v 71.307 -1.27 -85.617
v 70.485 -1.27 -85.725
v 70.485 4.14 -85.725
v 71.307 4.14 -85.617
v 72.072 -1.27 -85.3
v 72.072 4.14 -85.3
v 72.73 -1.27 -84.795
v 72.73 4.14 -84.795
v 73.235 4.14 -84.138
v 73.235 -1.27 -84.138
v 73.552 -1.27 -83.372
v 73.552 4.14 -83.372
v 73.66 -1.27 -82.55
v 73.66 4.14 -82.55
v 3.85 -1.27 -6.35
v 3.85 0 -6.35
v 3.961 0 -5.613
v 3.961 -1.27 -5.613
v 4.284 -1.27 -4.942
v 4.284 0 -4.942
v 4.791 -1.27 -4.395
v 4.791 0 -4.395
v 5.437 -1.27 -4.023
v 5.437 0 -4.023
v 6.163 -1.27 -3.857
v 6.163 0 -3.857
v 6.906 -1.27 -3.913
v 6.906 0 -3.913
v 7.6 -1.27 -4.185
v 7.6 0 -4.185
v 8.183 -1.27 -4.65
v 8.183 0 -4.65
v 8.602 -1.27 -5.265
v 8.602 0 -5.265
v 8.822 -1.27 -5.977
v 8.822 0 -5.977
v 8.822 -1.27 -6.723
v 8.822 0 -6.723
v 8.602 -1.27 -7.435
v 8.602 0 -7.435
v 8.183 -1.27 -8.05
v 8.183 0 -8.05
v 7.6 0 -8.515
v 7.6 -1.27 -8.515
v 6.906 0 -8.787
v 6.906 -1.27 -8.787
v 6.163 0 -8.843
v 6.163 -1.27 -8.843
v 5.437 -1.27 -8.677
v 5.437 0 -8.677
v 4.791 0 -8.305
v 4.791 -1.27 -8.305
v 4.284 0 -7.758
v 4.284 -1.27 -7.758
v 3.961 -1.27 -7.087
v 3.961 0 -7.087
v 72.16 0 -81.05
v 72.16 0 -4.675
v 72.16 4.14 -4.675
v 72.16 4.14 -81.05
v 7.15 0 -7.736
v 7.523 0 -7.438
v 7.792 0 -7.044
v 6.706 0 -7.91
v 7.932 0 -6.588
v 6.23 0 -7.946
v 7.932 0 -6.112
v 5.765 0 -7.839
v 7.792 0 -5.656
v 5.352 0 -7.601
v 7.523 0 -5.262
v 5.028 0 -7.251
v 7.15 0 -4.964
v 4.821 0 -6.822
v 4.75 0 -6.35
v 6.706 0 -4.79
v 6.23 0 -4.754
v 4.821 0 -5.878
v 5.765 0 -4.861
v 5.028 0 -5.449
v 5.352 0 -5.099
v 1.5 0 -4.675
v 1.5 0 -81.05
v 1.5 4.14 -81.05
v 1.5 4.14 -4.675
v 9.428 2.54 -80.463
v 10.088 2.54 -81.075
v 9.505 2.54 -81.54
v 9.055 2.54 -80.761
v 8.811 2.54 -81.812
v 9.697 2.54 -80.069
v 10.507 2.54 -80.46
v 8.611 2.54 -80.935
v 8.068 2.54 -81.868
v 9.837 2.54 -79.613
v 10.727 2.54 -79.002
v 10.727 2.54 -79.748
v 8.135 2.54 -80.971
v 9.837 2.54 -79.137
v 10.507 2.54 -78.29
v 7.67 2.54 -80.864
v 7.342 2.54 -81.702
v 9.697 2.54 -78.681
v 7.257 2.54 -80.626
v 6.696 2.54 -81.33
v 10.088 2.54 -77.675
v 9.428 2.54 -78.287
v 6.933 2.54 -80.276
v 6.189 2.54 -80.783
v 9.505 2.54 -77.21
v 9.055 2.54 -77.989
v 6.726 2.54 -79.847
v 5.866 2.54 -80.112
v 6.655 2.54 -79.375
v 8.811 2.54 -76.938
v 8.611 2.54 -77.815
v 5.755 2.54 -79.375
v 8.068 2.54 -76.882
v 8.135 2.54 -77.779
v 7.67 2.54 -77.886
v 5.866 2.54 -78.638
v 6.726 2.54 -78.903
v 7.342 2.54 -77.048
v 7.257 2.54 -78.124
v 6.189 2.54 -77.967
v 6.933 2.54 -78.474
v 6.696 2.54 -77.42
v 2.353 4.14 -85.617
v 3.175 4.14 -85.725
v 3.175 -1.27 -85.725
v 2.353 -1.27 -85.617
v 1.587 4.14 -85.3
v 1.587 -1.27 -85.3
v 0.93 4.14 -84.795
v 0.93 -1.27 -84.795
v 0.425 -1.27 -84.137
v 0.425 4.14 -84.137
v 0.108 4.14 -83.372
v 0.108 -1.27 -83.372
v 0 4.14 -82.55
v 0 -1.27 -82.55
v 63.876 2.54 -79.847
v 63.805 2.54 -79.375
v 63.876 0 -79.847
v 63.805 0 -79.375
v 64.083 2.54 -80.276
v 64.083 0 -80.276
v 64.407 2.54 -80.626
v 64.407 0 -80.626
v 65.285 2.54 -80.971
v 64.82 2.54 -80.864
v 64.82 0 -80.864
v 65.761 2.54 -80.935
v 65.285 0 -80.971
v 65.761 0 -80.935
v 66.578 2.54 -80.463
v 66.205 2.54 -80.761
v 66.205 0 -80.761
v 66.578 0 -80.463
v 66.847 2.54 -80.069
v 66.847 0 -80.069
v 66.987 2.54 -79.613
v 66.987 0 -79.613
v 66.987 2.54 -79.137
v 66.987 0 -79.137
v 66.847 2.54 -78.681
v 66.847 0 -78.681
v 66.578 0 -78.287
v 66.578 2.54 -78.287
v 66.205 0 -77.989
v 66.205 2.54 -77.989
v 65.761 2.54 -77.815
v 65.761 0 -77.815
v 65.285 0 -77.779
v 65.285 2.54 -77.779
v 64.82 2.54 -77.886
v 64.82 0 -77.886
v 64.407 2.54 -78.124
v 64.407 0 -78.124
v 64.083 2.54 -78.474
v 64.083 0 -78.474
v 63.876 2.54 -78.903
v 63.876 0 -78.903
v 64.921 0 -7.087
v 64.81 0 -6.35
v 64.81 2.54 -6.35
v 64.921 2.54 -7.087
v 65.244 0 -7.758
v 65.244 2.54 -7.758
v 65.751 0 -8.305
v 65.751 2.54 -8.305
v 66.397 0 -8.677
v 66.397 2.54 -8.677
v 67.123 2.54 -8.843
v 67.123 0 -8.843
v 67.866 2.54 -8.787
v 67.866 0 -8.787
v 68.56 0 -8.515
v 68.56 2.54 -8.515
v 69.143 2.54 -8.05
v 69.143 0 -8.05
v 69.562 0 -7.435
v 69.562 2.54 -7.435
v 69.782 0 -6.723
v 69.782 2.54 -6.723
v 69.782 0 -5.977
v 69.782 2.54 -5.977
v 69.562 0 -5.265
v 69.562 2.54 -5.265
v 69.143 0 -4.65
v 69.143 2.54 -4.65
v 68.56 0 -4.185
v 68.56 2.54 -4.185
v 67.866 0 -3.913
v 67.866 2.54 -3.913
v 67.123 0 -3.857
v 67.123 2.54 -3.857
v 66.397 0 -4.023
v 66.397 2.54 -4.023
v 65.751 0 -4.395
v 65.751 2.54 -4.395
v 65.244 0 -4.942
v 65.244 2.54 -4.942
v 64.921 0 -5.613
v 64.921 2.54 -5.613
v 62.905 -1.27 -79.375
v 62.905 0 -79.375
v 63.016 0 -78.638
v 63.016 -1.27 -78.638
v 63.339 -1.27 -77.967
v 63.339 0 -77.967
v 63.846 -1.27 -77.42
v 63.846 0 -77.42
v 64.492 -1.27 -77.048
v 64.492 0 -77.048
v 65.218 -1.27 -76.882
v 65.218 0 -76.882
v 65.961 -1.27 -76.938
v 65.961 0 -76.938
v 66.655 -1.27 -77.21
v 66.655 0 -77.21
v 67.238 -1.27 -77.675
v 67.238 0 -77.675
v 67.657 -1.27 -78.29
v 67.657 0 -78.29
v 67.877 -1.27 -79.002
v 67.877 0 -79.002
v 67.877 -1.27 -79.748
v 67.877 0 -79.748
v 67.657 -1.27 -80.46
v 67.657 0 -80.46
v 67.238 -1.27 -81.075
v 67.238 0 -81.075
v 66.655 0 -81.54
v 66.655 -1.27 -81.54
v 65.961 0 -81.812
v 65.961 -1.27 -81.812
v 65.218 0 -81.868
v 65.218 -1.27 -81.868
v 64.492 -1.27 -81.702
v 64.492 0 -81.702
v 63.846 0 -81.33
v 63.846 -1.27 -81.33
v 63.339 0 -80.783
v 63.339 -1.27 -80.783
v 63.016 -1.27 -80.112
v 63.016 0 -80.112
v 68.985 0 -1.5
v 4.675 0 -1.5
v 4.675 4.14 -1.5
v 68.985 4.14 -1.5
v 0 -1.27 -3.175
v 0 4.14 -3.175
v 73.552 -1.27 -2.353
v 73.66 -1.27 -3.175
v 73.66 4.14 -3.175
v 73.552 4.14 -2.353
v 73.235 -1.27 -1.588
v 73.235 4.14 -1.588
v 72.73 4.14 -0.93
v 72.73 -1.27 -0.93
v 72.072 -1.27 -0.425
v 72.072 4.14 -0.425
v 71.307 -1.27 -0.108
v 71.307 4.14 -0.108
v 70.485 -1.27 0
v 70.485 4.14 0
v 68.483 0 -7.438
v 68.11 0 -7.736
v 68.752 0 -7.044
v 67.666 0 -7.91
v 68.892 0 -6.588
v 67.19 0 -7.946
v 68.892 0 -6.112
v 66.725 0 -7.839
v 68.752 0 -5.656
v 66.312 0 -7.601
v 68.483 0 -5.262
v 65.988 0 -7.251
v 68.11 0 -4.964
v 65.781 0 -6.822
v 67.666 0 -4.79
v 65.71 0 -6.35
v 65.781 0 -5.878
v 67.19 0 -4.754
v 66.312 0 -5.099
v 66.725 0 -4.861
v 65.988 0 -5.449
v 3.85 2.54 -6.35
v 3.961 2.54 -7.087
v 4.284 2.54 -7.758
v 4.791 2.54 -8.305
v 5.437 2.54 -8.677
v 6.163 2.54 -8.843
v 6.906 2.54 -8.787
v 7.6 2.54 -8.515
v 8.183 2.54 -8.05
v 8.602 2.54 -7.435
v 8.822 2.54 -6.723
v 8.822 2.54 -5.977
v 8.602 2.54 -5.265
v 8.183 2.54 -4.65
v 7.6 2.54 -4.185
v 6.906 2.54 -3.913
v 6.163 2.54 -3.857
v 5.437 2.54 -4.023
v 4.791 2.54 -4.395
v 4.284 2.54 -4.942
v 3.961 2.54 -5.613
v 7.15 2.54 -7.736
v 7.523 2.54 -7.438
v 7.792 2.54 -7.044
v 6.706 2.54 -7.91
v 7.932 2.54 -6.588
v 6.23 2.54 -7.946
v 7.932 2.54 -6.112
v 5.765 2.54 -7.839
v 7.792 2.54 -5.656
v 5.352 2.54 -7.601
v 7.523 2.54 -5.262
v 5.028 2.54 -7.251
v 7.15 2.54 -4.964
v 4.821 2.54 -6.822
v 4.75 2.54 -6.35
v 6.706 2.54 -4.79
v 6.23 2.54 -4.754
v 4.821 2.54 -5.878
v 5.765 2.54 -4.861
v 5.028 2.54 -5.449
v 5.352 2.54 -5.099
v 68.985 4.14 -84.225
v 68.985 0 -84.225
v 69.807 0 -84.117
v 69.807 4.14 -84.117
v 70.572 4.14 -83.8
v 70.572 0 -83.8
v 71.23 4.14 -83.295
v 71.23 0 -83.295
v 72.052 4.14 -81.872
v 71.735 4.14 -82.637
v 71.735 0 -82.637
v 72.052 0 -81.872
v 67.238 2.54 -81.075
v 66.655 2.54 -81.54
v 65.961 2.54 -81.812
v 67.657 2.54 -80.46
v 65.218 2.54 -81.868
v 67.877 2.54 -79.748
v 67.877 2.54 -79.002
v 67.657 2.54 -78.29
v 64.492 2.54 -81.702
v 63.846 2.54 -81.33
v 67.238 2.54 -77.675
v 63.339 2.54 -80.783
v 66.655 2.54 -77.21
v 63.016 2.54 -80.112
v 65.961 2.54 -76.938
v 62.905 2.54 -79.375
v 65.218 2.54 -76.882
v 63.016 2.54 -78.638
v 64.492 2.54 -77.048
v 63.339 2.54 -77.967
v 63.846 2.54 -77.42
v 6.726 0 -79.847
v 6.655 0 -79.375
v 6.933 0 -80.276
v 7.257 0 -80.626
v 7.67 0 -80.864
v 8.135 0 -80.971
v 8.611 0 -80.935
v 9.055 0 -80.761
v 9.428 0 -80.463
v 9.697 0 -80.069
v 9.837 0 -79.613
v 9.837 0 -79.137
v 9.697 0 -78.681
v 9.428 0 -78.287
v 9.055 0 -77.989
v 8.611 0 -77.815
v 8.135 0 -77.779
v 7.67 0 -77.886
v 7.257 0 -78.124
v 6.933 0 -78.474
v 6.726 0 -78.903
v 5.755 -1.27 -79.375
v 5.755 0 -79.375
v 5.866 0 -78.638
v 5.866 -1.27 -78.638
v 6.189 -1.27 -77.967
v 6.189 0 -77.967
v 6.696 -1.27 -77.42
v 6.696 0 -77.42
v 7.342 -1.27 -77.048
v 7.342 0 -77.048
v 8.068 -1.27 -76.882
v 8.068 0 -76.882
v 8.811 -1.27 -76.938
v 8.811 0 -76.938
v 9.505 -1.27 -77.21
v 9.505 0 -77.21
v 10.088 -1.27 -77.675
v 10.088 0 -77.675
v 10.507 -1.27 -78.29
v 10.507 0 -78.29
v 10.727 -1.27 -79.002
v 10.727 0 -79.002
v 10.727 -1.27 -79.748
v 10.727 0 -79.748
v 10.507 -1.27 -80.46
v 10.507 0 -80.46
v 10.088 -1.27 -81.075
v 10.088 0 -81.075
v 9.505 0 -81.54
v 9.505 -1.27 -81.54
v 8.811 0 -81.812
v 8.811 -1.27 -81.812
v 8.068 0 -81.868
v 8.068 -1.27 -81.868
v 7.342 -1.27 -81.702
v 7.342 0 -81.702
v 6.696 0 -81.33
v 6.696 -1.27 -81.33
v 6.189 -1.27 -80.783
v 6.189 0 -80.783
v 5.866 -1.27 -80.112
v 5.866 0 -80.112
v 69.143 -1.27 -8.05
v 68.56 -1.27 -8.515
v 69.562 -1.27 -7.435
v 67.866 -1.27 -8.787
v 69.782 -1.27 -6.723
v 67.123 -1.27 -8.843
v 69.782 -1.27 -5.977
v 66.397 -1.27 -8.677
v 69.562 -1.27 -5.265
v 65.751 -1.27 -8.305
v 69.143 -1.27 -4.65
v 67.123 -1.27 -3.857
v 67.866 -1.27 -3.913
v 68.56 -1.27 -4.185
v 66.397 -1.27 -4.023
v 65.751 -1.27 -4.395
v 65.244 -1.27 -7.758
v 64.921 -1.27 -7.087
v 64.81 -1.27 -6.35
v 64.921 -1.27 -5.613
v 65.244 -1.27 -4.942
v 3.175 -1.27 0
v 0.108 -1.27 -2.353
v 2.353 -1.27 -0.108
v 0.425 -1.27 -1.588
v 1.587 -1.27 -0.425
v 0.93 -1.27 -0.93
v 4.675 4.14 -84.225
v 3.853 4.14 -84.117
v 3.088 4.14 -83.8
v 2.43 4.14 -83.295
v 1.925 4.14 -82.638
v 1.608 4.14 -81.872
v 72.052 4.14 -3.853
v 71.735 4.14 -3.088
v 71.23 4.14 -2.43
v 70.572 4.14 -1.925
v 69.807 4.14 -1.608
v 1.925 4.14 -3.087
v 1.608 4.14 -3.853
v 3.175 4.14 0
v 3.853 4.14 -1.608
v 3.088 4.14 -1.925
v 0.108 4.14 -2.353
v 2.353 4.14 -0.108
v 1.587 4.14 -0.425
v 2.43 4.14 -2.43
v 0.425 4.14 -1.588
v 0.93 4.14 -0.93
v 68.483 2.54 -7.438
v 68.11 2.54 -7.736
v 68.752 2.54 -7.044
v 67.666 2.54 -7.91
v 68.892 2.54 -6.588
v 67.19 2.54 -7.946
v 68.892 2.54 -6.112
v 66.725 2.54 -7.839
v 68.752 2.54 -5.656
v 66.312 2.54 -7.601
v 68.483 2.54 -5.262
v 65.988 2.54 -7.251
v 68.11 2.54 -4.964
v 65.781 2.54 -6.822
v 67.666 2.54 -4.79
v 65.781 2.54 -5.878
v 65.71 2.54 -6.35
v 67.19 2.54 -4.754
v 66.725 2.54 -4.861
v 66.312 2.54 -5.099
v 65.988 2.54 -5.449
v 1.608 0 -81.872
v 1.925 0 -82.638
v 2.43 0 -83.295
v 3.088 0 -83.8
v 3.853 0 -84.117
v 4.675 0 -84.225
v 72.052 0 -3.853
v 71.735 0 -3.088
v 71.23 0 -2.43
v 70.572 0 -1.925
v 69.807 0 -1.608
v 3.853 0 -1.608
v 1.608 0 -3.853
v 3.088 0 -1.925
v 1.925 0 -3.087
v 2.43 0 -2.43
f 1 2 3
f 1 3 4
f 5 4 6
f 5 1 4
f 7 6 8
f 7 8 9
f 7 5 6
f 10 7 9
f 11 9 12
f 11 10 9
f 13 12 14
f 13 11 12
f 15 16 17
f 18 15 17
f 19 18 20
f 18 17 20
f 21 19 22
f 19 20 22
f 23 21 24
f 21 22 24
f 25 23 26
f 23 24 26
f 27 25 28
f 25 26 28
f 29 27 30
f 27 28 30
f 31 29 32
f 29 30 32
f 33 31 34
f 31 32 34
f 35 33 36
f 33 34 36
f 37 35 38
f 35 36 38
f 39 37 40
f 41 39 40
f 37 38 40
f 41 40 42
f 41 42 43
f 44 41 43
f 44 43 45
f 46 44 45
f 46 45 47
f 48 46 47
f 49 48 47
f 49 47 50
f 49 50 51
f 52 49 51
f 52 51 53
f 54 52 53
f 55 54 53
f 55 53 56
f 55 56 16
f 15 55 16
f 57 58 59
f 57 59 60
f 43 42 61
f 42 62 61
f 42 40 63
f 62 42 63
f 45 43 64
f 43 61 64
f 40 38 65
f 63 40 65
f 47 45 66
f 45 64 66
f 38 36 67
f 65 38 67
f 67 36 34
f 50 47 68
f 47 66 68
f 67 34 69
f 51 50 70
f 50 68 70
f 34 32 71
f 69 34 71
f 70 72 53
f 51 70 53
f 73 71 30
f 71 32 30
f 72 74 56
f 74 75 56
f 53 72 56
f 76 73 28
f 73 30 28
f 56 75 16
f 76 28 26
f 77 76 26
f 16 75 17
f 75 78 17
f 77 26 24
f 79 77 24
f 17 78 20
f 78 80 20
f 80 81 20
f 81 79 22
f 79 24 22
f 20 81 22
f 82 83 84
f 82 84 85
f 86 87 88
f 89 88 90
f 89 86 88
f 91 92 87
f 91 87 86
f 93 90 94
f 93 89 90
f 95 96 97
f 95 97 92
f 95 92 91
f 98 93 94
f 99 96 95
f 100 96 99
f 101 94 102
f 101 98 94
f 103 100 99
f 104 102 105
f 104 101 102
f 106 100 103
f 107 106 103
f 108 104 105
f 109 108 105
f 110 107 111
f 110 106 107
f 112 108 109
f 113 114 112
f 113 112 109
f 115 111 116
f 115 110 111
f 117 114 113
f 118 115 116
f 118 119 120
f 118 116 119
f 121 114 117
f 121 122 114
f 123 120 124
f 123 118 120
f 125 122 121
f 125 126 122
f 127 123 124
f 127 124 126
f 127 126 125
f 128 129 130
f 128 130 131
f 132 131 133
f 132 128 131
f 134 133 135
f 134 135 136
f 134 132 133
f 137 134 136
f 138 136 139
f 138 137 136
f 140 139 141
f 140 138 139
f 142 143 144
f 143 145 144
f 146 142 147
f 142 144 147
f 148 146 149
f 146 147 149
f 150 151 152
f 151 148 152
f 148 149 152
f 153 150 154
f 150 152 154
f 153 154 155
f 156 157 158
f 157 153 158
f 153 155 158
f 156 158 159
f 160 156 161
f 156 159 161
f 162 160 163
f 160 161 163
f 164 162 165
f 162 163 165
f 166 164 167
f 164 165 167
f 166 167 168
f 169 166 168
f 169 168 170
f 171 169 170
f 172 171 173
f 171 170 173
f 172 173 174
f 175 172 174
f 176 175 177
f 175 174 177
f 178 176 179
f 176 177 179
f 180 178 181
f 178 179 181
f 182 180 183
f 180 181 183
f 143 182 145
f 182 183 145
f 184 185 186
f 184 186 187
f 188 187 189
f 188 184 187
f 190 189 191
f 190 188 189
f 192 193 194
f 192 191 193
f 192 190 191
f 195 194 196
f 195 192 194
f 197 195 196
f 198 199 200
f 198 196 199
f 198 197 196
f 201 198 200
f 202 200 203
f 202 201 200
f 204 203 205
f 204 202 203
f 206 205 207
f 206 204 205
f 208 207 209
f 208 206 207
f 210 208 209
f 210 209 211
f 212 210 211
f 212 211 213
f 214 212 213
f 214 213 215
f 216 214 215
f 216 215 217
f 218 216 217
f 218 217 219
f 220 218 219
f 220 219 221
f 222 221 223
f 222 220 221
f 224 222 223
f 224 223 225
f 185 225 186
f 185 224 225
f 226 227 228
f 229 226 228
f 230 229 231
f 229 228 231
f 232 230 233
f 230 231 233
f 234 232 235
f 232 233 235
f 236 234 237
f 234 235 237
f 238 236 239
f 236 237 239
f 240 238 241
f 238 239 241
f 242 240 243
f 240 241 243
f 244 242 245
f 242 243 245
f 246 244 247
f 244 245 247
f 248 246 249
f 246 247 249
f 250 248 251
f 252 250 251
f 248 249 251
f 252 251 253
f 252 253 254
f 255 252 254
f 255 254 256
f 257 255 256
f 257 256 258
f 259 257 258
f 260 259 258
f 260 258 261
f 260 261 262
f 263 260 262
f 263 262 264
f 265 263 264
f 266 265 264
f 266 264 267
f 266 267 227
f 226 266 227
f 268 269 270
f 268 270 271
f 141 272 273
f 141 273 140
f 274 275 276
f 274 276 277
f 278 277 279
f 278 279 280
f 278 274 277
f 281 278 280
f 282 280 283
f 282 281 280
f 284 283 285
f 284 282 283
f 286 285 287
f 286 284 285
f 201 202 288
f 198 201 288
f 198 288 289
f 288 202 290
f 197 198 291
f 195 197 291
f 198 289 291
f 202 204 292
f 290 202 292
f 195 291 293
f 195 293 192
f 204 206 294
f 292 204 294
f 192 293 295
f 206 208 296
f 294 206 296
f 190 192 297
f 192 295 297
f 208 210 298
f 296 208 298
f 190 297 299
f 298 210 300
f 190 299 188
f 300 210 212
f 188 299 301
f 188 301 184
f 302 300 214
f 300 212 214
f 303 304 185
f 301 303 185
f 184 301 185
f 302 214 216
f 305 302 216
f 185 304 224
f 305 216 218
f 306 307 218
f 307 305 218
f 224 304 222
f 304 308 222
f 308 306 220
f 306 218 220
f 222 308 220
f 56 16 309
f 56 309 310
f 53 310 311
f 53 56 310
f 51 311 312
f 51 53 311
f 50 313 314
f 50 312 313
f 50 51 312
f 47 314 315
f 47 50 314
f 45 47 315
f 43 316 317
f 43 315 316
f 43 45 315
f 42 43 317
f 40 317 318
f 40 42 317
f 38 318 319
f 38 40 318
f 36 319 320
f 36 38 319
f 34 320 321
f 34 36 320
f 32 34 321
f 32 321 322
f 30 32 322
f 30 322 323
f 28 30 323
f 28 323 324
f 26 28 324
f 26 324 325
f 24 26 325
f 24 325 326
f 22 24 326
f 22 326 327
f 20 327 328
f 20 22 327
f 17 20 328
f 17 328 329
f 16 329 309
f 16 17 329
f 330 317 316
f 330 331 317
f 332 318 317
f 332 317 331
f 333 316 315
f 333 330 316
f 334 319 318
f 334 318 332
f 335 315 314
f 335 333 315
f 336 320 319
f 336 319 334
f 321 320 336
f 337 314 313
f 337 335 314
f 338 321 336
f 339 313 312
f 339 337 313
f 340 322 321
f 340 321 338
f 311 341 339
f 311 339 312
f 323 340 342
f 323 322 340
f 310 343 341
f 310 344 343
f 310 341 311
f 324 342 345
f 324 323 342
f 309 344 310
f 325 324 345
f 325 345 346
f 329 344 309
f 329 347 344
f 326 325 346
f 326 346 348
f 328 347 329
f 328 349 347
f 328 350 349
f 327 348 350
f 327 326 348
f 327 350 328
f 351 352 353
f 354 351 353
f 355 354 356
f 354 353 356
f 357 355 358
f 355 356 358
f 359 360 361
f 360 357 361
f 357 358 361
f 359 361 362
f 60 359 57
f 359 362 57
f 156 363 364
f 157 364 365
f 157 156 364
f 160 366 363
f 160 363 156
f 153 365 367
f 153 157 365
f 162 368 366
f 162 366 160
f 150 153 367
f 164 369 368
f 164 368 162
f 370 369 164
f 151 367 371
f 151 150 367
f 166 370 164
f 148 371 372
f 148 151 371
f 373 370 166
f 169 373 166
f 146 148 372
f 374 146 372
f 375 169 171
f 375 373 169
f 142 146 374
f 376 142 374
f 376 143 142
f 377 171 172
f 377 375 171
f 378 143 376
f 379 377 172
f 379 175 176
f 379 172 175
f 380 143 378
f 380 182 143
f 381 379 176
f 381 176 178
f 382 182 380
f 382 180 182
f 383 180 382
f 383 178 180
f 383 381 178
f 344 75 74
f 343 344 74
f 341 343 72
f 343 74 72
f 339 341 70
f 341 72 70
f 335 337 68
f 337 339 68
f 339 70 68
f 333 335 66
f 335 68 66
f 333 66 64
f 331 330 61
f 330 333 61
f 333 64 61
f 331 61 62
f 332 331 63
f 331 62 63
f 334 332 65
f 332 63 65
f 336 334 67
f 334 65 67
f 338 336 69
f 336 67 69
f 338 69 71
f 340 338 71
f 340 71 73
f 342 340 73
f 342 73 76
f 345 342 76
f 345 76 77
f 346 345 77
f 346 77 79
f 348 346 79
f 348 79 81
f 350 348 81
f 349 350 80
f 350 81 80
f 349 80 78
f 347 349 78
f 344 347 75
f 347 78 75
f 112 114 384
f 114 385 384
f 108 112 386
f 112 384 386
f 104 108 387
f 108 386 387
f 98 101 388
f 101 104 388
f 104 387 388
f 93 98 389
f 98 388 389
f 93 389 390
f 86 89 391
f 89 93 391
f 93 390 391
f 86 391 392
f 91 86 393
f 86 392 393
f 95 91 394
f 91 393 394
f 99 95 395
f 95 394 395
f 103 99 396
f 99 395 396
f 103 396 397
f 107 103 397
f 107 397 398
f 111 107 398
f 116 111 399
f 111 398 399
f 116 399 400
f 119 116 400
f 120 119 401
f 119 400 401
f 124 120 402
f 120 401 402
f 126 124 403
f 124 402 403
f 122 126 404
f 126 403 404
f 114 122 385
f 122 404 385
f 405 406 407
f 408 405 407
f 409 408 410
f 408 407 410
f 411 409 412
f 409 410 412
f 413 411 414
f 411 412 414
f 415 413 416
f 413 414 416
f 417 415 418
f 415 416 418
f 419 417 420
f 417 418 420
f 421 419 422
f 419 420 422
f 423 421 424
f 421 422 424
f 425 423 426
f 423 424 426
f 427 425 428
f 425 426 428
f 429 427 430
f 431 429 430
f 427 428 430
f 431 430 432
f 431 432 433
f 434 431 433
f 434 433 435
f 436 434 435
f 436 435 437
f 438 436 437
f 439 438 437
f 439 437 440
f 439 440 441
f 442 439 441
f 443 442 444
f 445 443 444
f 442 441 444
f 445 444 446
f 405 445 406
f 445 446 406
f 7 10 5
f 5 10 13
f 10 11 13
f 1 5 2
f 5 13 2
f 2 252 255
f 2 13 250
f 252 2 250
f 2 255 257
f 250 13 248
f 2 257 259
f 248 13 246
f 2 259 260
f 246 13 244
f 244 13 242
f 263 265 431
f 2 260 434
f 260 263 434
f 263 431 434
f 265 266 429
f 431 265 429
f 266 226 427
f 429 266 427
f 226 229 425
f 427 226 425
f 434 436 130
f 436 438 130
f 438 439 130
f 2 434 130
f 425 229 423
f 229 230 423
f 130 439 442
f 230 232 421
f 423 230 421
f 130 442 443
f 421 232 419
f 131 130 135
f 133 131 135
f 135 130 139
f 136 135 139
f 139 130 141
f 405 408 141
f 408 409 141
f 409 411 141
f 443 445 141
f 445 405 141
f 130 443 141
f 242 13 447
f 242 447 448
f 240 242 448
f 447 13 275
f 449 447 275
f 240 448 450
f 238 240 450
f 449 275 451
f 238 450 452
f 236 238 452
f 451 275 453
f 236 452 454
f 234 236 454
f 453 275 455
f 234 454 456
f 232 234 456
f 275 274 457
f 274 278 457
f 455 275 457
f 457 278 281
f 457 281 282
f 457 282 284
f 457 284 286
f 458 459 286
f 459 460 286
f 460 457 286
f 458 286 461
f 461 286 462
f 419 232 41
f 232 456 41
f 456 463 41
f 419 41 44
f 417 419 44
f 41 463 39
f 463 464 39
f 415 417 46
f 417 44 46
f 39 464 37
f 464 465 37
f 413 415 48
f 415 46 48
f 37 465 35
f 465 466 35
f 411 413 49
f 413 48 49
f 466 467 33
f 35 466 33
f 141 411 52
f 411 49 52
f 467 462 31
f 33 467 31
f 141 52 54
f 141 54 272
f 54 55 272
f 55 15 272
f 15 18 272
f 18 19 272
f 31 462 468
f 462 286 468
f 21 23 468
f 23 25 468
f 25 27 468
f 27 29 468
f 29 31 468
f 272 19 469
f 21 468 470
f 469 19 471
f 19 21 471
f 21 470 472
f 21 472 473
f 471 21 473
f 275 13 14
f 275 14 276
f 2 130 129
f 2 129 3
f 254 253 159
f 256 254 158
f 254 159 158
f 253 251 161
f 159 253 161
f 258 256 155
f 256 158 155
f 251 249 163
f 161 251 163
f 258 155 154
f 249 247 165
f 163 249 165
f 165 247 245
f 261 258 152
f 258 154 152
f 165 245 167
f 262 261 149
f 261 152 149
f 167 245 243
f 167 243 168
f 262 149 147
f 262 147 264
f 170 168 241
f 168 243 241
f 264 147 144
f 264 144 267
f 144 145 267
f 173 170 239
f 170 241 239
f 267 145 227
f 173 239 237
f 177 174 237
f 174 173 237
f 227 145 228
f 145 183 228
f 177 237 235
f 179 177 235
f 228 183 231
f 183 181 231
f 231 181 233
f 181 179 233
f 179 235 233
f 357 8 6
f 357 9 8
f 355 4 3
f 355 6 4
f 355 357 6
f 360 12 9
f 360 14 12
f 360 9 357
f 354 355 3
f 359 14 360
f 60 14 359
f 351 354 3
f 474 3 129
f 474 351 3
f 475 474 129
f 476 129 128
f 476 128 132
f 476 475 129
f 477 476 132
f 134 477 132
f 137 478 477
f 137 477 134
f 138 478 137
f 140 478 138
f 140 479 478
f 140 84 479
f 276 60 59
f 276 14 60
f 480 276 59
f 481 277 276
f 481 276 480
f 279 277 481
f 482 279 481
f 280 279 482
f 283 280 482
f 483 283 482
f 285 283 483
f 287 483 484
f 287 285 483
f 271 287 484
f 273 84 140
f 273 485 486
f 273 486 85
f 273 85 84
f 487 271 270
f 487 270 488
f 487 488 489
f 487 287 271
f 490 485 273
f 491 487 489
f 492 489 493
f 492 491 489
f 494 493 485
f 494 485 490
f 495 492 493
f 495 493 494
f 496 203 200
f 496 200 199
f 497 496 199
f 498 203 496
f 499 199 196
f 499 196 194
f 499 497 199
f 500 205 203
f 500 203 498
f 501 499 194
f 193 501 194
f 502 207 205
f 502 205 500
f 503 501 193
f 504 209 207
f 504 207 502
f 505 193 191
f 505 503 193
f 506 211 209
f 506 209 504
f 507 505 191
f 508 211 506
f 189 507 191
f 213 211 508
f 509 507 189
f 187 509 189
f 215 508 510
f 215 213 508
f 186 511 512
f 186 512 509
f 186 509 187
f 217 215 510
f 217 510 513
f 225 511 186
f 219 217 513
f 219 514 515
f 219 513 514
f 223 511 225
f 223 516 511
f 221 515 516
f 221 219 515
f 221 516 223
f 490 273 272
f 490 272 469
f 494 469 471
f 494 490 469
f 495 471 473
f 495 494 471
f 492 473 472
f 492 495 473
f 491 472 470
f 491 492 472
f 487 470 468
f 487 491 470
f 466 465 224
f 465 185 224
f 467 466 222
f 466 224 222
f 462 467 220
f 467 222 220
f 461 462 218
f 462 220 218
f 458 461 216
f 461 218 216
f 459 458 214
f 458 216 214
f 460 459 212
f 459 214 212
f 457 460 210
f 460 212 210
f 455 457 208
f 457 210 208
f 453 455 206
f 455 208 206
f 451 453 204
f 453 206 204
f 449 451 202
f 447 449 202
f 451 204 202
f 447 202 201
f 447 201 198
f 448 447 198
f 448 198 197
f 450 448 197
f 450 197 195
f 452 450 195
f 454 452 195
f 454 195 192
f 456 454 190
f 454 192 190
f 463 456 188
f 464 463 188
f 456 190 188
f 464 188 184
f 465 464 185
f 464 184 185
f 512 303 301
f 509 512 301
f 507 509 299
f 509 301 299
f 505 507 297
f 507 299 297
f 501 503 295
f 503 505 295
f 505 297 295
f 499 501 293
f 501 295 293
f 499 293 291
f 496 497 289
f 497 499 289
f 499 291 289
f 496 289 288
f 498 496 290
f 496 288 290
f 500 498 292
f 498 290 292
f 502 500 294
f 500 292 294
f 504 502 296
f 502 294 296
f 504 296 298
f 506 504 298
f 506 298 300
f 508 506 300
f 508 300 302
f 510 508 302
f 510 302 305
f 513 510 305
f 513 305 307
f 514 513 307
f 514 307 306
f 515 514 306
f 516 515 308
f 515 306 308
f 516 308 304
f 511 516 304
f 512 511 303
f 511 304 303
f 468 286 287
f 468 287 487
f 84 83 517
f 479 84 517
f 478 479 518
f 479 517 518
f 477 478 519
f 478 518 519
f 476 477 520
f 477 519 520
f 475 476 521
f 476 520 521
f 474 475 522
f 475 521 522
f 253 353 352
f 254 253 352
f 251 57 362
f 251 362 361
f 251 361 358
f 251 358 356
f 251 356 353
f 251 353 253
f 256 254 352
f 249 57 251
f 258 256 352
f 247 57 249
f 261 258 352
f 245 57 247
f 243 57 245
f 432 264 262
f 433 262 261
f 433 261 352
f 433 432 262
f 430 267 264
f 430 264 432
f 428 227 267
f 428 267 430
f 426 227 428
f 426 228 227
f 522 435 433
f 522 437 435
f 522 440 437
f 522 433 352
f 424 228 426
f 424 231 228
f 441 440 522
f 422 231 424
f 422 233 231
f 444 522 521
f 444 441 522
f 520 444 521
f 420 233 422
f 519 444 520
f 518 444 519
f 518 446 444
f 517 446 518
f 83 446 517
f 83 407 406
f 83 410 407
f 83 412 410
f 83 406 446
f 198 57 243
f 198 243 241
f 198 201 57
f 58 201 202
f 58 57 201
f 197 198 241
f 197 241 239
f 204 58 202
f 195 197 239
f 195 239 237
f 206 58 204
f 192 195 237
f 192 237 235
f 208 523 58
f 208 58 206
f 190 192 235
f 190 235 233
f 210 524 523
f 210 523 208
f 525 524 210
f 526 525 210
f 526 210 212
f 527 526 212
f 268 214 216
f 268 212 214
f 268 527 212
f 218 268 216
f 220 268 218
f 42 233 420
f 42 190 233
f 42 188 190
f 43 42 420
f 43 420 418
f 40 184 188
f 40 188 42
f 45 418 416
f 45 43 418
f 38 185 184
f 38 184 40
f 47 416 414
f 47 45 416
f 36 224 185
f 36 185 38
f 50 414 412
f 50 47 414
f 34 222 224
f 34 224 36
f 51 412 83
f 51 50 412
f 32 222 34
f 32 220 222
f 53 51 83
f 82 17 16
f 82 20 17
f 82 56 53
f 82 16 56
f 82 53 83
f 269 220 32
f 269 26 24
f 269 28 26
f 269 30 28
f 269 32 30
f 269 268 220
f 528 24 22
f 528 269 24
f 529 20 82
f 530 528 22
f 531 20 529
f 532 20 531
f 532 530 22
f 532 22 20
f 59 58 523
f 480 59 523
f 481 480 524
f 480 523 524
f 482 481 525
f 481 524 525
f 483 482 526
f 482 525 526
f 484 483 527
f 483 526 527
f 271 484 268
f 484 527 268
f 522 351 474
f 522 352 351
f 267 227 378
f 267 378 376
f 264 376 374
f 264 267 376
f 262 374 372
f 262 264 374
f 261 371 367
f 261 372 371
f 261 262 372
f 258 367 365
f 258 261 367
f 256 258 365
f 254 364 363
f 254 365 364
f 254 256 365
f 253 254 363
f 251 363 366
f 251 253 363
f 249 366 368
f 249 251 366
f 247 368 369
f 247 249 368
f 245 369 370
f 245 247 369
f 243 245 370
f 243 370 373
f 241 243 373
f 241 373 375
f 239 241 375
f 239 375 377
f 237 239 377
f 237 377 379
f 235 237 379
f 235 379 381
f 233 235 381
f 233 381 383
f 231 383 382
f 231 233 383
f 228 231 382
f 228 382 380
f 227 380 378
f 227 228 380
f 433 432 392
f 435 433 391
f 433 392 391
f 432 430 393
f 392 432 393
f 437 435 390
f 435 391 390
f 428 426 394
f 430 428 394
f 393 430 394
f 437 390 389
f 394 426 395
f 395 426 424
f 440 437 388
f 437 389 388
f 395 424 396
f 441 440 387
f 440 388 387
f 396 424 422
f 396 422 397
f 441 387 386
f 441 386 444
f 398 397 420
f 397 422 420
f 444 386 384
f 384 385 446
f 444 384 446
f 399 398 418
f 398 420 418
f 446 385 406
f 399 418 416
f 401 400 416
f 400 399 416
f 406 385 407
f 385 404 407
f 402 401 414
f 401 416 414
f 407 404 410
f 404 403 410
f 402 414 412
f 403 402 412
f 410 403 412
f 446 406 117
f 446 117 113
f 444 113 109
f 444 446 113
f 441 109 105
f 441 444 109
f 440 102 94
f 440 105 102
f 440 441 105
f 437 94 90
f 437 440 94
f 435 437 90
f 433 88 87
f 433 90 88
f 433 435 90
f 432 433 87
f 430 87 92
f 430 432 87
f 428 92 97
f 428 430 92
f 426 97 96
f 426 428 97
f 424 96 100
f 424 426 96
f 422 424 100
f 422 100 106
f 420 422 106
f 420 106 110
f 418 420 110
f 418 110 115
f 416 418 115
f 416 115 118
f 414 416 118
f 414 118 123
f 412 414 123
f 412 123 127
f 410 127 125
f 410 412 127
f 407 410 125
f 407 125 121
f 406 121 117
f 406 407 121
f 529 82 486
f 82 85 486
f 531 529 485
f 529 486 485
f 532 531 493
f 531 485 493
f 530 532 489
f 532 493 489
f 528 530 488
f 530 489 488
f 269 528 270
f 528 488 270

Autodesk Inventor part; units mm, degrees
ref_plane "YZ Plane" through (0, 0, 0) normal (1, 0, 0) x (0, 1, 0)
ref_plane "XZ Plane" through (0, 0, 0) normal (0, 1, 0) x (-1, 0, 0)
ref_plane "XY Plane" through (0, 0, 0) normal (0, 0, 1) x (1, 0, 0)
sketch "Sketch1" plane through (0, 0, 0) normal (0, 1, 0) x (-1, 0, 0)
  line L0 (-2.54, -2.54) -> (-71.12, -2.54) construction
  line L1 (-71.12, -2.54) -> (-71.12, -83.185) construction
  line L2 (-71.12, -83.185) -> (-2.54, -83.185) construction
  line L3 (-2.54, -83.185) -> (-2.54, -2.54) construction
  circle A0 centre (-6.35, -6.35) radius 1.6
  circle A1 centre (-8.255, -79.375) radius 1.6
  circle A2 centre (-67.31, -6.35) radius 1.6
  circle A3 centre (-65.405, -79.375) radius 1.6
  line L4 (-8.255, -79.375) -> (-65.405, -79.375) construction
  line L5 (-6.35, -6.35) -> (-67.31, -6.35) construction
  line L6 (-6.35, -6.35) -> (-8.255, -79.375) construction
  line L7 (-67.31, -6.35) -> (-65.405, -79.375) construction
  line L8 (0, -85.725) -> (-73.66, -85.725)
  line L9 (-73.66, -85.725) -> (-73.66, 0)
  line L10 (-73.66, 0) -> (0, 0)
  line L11 (0, 0) -> (0, -85.725)
  line L12 (-2.54, -83.185) -> (0, -85.725) construction
  line L13 (-71.12, -83.185) -> (-73.66, -85.725) construction
  line L14 (-73.66, 0) -> (-71.12, -2.54) construction
  line L15 (0, 0) -> (-2.54, -2.54) construction
  line L16 (-1.5, -1.5) -> (-72.16, -1.5)
  line L17 (-72.16, -1.5) -> (-72.16, -84.225)
  line L18 (-72.16, -84.225) -> (-1.5, -84.225)
  line L19 (-1.5, -84.225) -> (-1.5, -1.5)
  circle A4 centre (-6.35, -6.35) radius 2.5
  circle A5 centre (-8.255, -79.375) radius 2.5
  circle A6 centre (-65.405, -79.375) radius 2.5
  circle A7 centre (-67.31, -6.35) radius 2.5
  dimension "d0" = 3.2
  dimension "d1" = 57.15
  dimension "d2" = 60.96
  dimension "d3" = 73.025
  dimension "d4" = 68.58
  dimension "d5" = 80.645
  dimension "d6" = 2.54
  dimension "d7" = 2.54
  dimension "d8" = 1.5
  dimension "d9" = 5
  dimension "d16" = 3.81
  dimension "d17" = 3.81
  dimension "d18" = 3.81
extrude "Extrusion1" add sketch "Sketch1" against normal blind 1.27 contours L8 L9 L10 L11 | L19 L18 L17 L16
extrude "Extrusion2" add sketch "Sketch1" along normal blind 2.54
extrude "Extrusion3" add sketch "Sketch1" along normal blind 1.6 from surface at 2.54 contours L8 L9 L10 L11
fillet "Fillet1" radius 3.175 8 edges at (0, 1.435, 0) (1.5, 2.07, -1.5) (1.5, 2.07, -84.225) (0, 1.435, -85.725) (72.16, 2.07, -84.225) (73.66, 1.435, -85.725) (72.16, 2.07, -1.5) (73.66, 1.435, 0)
properties part number "Buttom Part"
